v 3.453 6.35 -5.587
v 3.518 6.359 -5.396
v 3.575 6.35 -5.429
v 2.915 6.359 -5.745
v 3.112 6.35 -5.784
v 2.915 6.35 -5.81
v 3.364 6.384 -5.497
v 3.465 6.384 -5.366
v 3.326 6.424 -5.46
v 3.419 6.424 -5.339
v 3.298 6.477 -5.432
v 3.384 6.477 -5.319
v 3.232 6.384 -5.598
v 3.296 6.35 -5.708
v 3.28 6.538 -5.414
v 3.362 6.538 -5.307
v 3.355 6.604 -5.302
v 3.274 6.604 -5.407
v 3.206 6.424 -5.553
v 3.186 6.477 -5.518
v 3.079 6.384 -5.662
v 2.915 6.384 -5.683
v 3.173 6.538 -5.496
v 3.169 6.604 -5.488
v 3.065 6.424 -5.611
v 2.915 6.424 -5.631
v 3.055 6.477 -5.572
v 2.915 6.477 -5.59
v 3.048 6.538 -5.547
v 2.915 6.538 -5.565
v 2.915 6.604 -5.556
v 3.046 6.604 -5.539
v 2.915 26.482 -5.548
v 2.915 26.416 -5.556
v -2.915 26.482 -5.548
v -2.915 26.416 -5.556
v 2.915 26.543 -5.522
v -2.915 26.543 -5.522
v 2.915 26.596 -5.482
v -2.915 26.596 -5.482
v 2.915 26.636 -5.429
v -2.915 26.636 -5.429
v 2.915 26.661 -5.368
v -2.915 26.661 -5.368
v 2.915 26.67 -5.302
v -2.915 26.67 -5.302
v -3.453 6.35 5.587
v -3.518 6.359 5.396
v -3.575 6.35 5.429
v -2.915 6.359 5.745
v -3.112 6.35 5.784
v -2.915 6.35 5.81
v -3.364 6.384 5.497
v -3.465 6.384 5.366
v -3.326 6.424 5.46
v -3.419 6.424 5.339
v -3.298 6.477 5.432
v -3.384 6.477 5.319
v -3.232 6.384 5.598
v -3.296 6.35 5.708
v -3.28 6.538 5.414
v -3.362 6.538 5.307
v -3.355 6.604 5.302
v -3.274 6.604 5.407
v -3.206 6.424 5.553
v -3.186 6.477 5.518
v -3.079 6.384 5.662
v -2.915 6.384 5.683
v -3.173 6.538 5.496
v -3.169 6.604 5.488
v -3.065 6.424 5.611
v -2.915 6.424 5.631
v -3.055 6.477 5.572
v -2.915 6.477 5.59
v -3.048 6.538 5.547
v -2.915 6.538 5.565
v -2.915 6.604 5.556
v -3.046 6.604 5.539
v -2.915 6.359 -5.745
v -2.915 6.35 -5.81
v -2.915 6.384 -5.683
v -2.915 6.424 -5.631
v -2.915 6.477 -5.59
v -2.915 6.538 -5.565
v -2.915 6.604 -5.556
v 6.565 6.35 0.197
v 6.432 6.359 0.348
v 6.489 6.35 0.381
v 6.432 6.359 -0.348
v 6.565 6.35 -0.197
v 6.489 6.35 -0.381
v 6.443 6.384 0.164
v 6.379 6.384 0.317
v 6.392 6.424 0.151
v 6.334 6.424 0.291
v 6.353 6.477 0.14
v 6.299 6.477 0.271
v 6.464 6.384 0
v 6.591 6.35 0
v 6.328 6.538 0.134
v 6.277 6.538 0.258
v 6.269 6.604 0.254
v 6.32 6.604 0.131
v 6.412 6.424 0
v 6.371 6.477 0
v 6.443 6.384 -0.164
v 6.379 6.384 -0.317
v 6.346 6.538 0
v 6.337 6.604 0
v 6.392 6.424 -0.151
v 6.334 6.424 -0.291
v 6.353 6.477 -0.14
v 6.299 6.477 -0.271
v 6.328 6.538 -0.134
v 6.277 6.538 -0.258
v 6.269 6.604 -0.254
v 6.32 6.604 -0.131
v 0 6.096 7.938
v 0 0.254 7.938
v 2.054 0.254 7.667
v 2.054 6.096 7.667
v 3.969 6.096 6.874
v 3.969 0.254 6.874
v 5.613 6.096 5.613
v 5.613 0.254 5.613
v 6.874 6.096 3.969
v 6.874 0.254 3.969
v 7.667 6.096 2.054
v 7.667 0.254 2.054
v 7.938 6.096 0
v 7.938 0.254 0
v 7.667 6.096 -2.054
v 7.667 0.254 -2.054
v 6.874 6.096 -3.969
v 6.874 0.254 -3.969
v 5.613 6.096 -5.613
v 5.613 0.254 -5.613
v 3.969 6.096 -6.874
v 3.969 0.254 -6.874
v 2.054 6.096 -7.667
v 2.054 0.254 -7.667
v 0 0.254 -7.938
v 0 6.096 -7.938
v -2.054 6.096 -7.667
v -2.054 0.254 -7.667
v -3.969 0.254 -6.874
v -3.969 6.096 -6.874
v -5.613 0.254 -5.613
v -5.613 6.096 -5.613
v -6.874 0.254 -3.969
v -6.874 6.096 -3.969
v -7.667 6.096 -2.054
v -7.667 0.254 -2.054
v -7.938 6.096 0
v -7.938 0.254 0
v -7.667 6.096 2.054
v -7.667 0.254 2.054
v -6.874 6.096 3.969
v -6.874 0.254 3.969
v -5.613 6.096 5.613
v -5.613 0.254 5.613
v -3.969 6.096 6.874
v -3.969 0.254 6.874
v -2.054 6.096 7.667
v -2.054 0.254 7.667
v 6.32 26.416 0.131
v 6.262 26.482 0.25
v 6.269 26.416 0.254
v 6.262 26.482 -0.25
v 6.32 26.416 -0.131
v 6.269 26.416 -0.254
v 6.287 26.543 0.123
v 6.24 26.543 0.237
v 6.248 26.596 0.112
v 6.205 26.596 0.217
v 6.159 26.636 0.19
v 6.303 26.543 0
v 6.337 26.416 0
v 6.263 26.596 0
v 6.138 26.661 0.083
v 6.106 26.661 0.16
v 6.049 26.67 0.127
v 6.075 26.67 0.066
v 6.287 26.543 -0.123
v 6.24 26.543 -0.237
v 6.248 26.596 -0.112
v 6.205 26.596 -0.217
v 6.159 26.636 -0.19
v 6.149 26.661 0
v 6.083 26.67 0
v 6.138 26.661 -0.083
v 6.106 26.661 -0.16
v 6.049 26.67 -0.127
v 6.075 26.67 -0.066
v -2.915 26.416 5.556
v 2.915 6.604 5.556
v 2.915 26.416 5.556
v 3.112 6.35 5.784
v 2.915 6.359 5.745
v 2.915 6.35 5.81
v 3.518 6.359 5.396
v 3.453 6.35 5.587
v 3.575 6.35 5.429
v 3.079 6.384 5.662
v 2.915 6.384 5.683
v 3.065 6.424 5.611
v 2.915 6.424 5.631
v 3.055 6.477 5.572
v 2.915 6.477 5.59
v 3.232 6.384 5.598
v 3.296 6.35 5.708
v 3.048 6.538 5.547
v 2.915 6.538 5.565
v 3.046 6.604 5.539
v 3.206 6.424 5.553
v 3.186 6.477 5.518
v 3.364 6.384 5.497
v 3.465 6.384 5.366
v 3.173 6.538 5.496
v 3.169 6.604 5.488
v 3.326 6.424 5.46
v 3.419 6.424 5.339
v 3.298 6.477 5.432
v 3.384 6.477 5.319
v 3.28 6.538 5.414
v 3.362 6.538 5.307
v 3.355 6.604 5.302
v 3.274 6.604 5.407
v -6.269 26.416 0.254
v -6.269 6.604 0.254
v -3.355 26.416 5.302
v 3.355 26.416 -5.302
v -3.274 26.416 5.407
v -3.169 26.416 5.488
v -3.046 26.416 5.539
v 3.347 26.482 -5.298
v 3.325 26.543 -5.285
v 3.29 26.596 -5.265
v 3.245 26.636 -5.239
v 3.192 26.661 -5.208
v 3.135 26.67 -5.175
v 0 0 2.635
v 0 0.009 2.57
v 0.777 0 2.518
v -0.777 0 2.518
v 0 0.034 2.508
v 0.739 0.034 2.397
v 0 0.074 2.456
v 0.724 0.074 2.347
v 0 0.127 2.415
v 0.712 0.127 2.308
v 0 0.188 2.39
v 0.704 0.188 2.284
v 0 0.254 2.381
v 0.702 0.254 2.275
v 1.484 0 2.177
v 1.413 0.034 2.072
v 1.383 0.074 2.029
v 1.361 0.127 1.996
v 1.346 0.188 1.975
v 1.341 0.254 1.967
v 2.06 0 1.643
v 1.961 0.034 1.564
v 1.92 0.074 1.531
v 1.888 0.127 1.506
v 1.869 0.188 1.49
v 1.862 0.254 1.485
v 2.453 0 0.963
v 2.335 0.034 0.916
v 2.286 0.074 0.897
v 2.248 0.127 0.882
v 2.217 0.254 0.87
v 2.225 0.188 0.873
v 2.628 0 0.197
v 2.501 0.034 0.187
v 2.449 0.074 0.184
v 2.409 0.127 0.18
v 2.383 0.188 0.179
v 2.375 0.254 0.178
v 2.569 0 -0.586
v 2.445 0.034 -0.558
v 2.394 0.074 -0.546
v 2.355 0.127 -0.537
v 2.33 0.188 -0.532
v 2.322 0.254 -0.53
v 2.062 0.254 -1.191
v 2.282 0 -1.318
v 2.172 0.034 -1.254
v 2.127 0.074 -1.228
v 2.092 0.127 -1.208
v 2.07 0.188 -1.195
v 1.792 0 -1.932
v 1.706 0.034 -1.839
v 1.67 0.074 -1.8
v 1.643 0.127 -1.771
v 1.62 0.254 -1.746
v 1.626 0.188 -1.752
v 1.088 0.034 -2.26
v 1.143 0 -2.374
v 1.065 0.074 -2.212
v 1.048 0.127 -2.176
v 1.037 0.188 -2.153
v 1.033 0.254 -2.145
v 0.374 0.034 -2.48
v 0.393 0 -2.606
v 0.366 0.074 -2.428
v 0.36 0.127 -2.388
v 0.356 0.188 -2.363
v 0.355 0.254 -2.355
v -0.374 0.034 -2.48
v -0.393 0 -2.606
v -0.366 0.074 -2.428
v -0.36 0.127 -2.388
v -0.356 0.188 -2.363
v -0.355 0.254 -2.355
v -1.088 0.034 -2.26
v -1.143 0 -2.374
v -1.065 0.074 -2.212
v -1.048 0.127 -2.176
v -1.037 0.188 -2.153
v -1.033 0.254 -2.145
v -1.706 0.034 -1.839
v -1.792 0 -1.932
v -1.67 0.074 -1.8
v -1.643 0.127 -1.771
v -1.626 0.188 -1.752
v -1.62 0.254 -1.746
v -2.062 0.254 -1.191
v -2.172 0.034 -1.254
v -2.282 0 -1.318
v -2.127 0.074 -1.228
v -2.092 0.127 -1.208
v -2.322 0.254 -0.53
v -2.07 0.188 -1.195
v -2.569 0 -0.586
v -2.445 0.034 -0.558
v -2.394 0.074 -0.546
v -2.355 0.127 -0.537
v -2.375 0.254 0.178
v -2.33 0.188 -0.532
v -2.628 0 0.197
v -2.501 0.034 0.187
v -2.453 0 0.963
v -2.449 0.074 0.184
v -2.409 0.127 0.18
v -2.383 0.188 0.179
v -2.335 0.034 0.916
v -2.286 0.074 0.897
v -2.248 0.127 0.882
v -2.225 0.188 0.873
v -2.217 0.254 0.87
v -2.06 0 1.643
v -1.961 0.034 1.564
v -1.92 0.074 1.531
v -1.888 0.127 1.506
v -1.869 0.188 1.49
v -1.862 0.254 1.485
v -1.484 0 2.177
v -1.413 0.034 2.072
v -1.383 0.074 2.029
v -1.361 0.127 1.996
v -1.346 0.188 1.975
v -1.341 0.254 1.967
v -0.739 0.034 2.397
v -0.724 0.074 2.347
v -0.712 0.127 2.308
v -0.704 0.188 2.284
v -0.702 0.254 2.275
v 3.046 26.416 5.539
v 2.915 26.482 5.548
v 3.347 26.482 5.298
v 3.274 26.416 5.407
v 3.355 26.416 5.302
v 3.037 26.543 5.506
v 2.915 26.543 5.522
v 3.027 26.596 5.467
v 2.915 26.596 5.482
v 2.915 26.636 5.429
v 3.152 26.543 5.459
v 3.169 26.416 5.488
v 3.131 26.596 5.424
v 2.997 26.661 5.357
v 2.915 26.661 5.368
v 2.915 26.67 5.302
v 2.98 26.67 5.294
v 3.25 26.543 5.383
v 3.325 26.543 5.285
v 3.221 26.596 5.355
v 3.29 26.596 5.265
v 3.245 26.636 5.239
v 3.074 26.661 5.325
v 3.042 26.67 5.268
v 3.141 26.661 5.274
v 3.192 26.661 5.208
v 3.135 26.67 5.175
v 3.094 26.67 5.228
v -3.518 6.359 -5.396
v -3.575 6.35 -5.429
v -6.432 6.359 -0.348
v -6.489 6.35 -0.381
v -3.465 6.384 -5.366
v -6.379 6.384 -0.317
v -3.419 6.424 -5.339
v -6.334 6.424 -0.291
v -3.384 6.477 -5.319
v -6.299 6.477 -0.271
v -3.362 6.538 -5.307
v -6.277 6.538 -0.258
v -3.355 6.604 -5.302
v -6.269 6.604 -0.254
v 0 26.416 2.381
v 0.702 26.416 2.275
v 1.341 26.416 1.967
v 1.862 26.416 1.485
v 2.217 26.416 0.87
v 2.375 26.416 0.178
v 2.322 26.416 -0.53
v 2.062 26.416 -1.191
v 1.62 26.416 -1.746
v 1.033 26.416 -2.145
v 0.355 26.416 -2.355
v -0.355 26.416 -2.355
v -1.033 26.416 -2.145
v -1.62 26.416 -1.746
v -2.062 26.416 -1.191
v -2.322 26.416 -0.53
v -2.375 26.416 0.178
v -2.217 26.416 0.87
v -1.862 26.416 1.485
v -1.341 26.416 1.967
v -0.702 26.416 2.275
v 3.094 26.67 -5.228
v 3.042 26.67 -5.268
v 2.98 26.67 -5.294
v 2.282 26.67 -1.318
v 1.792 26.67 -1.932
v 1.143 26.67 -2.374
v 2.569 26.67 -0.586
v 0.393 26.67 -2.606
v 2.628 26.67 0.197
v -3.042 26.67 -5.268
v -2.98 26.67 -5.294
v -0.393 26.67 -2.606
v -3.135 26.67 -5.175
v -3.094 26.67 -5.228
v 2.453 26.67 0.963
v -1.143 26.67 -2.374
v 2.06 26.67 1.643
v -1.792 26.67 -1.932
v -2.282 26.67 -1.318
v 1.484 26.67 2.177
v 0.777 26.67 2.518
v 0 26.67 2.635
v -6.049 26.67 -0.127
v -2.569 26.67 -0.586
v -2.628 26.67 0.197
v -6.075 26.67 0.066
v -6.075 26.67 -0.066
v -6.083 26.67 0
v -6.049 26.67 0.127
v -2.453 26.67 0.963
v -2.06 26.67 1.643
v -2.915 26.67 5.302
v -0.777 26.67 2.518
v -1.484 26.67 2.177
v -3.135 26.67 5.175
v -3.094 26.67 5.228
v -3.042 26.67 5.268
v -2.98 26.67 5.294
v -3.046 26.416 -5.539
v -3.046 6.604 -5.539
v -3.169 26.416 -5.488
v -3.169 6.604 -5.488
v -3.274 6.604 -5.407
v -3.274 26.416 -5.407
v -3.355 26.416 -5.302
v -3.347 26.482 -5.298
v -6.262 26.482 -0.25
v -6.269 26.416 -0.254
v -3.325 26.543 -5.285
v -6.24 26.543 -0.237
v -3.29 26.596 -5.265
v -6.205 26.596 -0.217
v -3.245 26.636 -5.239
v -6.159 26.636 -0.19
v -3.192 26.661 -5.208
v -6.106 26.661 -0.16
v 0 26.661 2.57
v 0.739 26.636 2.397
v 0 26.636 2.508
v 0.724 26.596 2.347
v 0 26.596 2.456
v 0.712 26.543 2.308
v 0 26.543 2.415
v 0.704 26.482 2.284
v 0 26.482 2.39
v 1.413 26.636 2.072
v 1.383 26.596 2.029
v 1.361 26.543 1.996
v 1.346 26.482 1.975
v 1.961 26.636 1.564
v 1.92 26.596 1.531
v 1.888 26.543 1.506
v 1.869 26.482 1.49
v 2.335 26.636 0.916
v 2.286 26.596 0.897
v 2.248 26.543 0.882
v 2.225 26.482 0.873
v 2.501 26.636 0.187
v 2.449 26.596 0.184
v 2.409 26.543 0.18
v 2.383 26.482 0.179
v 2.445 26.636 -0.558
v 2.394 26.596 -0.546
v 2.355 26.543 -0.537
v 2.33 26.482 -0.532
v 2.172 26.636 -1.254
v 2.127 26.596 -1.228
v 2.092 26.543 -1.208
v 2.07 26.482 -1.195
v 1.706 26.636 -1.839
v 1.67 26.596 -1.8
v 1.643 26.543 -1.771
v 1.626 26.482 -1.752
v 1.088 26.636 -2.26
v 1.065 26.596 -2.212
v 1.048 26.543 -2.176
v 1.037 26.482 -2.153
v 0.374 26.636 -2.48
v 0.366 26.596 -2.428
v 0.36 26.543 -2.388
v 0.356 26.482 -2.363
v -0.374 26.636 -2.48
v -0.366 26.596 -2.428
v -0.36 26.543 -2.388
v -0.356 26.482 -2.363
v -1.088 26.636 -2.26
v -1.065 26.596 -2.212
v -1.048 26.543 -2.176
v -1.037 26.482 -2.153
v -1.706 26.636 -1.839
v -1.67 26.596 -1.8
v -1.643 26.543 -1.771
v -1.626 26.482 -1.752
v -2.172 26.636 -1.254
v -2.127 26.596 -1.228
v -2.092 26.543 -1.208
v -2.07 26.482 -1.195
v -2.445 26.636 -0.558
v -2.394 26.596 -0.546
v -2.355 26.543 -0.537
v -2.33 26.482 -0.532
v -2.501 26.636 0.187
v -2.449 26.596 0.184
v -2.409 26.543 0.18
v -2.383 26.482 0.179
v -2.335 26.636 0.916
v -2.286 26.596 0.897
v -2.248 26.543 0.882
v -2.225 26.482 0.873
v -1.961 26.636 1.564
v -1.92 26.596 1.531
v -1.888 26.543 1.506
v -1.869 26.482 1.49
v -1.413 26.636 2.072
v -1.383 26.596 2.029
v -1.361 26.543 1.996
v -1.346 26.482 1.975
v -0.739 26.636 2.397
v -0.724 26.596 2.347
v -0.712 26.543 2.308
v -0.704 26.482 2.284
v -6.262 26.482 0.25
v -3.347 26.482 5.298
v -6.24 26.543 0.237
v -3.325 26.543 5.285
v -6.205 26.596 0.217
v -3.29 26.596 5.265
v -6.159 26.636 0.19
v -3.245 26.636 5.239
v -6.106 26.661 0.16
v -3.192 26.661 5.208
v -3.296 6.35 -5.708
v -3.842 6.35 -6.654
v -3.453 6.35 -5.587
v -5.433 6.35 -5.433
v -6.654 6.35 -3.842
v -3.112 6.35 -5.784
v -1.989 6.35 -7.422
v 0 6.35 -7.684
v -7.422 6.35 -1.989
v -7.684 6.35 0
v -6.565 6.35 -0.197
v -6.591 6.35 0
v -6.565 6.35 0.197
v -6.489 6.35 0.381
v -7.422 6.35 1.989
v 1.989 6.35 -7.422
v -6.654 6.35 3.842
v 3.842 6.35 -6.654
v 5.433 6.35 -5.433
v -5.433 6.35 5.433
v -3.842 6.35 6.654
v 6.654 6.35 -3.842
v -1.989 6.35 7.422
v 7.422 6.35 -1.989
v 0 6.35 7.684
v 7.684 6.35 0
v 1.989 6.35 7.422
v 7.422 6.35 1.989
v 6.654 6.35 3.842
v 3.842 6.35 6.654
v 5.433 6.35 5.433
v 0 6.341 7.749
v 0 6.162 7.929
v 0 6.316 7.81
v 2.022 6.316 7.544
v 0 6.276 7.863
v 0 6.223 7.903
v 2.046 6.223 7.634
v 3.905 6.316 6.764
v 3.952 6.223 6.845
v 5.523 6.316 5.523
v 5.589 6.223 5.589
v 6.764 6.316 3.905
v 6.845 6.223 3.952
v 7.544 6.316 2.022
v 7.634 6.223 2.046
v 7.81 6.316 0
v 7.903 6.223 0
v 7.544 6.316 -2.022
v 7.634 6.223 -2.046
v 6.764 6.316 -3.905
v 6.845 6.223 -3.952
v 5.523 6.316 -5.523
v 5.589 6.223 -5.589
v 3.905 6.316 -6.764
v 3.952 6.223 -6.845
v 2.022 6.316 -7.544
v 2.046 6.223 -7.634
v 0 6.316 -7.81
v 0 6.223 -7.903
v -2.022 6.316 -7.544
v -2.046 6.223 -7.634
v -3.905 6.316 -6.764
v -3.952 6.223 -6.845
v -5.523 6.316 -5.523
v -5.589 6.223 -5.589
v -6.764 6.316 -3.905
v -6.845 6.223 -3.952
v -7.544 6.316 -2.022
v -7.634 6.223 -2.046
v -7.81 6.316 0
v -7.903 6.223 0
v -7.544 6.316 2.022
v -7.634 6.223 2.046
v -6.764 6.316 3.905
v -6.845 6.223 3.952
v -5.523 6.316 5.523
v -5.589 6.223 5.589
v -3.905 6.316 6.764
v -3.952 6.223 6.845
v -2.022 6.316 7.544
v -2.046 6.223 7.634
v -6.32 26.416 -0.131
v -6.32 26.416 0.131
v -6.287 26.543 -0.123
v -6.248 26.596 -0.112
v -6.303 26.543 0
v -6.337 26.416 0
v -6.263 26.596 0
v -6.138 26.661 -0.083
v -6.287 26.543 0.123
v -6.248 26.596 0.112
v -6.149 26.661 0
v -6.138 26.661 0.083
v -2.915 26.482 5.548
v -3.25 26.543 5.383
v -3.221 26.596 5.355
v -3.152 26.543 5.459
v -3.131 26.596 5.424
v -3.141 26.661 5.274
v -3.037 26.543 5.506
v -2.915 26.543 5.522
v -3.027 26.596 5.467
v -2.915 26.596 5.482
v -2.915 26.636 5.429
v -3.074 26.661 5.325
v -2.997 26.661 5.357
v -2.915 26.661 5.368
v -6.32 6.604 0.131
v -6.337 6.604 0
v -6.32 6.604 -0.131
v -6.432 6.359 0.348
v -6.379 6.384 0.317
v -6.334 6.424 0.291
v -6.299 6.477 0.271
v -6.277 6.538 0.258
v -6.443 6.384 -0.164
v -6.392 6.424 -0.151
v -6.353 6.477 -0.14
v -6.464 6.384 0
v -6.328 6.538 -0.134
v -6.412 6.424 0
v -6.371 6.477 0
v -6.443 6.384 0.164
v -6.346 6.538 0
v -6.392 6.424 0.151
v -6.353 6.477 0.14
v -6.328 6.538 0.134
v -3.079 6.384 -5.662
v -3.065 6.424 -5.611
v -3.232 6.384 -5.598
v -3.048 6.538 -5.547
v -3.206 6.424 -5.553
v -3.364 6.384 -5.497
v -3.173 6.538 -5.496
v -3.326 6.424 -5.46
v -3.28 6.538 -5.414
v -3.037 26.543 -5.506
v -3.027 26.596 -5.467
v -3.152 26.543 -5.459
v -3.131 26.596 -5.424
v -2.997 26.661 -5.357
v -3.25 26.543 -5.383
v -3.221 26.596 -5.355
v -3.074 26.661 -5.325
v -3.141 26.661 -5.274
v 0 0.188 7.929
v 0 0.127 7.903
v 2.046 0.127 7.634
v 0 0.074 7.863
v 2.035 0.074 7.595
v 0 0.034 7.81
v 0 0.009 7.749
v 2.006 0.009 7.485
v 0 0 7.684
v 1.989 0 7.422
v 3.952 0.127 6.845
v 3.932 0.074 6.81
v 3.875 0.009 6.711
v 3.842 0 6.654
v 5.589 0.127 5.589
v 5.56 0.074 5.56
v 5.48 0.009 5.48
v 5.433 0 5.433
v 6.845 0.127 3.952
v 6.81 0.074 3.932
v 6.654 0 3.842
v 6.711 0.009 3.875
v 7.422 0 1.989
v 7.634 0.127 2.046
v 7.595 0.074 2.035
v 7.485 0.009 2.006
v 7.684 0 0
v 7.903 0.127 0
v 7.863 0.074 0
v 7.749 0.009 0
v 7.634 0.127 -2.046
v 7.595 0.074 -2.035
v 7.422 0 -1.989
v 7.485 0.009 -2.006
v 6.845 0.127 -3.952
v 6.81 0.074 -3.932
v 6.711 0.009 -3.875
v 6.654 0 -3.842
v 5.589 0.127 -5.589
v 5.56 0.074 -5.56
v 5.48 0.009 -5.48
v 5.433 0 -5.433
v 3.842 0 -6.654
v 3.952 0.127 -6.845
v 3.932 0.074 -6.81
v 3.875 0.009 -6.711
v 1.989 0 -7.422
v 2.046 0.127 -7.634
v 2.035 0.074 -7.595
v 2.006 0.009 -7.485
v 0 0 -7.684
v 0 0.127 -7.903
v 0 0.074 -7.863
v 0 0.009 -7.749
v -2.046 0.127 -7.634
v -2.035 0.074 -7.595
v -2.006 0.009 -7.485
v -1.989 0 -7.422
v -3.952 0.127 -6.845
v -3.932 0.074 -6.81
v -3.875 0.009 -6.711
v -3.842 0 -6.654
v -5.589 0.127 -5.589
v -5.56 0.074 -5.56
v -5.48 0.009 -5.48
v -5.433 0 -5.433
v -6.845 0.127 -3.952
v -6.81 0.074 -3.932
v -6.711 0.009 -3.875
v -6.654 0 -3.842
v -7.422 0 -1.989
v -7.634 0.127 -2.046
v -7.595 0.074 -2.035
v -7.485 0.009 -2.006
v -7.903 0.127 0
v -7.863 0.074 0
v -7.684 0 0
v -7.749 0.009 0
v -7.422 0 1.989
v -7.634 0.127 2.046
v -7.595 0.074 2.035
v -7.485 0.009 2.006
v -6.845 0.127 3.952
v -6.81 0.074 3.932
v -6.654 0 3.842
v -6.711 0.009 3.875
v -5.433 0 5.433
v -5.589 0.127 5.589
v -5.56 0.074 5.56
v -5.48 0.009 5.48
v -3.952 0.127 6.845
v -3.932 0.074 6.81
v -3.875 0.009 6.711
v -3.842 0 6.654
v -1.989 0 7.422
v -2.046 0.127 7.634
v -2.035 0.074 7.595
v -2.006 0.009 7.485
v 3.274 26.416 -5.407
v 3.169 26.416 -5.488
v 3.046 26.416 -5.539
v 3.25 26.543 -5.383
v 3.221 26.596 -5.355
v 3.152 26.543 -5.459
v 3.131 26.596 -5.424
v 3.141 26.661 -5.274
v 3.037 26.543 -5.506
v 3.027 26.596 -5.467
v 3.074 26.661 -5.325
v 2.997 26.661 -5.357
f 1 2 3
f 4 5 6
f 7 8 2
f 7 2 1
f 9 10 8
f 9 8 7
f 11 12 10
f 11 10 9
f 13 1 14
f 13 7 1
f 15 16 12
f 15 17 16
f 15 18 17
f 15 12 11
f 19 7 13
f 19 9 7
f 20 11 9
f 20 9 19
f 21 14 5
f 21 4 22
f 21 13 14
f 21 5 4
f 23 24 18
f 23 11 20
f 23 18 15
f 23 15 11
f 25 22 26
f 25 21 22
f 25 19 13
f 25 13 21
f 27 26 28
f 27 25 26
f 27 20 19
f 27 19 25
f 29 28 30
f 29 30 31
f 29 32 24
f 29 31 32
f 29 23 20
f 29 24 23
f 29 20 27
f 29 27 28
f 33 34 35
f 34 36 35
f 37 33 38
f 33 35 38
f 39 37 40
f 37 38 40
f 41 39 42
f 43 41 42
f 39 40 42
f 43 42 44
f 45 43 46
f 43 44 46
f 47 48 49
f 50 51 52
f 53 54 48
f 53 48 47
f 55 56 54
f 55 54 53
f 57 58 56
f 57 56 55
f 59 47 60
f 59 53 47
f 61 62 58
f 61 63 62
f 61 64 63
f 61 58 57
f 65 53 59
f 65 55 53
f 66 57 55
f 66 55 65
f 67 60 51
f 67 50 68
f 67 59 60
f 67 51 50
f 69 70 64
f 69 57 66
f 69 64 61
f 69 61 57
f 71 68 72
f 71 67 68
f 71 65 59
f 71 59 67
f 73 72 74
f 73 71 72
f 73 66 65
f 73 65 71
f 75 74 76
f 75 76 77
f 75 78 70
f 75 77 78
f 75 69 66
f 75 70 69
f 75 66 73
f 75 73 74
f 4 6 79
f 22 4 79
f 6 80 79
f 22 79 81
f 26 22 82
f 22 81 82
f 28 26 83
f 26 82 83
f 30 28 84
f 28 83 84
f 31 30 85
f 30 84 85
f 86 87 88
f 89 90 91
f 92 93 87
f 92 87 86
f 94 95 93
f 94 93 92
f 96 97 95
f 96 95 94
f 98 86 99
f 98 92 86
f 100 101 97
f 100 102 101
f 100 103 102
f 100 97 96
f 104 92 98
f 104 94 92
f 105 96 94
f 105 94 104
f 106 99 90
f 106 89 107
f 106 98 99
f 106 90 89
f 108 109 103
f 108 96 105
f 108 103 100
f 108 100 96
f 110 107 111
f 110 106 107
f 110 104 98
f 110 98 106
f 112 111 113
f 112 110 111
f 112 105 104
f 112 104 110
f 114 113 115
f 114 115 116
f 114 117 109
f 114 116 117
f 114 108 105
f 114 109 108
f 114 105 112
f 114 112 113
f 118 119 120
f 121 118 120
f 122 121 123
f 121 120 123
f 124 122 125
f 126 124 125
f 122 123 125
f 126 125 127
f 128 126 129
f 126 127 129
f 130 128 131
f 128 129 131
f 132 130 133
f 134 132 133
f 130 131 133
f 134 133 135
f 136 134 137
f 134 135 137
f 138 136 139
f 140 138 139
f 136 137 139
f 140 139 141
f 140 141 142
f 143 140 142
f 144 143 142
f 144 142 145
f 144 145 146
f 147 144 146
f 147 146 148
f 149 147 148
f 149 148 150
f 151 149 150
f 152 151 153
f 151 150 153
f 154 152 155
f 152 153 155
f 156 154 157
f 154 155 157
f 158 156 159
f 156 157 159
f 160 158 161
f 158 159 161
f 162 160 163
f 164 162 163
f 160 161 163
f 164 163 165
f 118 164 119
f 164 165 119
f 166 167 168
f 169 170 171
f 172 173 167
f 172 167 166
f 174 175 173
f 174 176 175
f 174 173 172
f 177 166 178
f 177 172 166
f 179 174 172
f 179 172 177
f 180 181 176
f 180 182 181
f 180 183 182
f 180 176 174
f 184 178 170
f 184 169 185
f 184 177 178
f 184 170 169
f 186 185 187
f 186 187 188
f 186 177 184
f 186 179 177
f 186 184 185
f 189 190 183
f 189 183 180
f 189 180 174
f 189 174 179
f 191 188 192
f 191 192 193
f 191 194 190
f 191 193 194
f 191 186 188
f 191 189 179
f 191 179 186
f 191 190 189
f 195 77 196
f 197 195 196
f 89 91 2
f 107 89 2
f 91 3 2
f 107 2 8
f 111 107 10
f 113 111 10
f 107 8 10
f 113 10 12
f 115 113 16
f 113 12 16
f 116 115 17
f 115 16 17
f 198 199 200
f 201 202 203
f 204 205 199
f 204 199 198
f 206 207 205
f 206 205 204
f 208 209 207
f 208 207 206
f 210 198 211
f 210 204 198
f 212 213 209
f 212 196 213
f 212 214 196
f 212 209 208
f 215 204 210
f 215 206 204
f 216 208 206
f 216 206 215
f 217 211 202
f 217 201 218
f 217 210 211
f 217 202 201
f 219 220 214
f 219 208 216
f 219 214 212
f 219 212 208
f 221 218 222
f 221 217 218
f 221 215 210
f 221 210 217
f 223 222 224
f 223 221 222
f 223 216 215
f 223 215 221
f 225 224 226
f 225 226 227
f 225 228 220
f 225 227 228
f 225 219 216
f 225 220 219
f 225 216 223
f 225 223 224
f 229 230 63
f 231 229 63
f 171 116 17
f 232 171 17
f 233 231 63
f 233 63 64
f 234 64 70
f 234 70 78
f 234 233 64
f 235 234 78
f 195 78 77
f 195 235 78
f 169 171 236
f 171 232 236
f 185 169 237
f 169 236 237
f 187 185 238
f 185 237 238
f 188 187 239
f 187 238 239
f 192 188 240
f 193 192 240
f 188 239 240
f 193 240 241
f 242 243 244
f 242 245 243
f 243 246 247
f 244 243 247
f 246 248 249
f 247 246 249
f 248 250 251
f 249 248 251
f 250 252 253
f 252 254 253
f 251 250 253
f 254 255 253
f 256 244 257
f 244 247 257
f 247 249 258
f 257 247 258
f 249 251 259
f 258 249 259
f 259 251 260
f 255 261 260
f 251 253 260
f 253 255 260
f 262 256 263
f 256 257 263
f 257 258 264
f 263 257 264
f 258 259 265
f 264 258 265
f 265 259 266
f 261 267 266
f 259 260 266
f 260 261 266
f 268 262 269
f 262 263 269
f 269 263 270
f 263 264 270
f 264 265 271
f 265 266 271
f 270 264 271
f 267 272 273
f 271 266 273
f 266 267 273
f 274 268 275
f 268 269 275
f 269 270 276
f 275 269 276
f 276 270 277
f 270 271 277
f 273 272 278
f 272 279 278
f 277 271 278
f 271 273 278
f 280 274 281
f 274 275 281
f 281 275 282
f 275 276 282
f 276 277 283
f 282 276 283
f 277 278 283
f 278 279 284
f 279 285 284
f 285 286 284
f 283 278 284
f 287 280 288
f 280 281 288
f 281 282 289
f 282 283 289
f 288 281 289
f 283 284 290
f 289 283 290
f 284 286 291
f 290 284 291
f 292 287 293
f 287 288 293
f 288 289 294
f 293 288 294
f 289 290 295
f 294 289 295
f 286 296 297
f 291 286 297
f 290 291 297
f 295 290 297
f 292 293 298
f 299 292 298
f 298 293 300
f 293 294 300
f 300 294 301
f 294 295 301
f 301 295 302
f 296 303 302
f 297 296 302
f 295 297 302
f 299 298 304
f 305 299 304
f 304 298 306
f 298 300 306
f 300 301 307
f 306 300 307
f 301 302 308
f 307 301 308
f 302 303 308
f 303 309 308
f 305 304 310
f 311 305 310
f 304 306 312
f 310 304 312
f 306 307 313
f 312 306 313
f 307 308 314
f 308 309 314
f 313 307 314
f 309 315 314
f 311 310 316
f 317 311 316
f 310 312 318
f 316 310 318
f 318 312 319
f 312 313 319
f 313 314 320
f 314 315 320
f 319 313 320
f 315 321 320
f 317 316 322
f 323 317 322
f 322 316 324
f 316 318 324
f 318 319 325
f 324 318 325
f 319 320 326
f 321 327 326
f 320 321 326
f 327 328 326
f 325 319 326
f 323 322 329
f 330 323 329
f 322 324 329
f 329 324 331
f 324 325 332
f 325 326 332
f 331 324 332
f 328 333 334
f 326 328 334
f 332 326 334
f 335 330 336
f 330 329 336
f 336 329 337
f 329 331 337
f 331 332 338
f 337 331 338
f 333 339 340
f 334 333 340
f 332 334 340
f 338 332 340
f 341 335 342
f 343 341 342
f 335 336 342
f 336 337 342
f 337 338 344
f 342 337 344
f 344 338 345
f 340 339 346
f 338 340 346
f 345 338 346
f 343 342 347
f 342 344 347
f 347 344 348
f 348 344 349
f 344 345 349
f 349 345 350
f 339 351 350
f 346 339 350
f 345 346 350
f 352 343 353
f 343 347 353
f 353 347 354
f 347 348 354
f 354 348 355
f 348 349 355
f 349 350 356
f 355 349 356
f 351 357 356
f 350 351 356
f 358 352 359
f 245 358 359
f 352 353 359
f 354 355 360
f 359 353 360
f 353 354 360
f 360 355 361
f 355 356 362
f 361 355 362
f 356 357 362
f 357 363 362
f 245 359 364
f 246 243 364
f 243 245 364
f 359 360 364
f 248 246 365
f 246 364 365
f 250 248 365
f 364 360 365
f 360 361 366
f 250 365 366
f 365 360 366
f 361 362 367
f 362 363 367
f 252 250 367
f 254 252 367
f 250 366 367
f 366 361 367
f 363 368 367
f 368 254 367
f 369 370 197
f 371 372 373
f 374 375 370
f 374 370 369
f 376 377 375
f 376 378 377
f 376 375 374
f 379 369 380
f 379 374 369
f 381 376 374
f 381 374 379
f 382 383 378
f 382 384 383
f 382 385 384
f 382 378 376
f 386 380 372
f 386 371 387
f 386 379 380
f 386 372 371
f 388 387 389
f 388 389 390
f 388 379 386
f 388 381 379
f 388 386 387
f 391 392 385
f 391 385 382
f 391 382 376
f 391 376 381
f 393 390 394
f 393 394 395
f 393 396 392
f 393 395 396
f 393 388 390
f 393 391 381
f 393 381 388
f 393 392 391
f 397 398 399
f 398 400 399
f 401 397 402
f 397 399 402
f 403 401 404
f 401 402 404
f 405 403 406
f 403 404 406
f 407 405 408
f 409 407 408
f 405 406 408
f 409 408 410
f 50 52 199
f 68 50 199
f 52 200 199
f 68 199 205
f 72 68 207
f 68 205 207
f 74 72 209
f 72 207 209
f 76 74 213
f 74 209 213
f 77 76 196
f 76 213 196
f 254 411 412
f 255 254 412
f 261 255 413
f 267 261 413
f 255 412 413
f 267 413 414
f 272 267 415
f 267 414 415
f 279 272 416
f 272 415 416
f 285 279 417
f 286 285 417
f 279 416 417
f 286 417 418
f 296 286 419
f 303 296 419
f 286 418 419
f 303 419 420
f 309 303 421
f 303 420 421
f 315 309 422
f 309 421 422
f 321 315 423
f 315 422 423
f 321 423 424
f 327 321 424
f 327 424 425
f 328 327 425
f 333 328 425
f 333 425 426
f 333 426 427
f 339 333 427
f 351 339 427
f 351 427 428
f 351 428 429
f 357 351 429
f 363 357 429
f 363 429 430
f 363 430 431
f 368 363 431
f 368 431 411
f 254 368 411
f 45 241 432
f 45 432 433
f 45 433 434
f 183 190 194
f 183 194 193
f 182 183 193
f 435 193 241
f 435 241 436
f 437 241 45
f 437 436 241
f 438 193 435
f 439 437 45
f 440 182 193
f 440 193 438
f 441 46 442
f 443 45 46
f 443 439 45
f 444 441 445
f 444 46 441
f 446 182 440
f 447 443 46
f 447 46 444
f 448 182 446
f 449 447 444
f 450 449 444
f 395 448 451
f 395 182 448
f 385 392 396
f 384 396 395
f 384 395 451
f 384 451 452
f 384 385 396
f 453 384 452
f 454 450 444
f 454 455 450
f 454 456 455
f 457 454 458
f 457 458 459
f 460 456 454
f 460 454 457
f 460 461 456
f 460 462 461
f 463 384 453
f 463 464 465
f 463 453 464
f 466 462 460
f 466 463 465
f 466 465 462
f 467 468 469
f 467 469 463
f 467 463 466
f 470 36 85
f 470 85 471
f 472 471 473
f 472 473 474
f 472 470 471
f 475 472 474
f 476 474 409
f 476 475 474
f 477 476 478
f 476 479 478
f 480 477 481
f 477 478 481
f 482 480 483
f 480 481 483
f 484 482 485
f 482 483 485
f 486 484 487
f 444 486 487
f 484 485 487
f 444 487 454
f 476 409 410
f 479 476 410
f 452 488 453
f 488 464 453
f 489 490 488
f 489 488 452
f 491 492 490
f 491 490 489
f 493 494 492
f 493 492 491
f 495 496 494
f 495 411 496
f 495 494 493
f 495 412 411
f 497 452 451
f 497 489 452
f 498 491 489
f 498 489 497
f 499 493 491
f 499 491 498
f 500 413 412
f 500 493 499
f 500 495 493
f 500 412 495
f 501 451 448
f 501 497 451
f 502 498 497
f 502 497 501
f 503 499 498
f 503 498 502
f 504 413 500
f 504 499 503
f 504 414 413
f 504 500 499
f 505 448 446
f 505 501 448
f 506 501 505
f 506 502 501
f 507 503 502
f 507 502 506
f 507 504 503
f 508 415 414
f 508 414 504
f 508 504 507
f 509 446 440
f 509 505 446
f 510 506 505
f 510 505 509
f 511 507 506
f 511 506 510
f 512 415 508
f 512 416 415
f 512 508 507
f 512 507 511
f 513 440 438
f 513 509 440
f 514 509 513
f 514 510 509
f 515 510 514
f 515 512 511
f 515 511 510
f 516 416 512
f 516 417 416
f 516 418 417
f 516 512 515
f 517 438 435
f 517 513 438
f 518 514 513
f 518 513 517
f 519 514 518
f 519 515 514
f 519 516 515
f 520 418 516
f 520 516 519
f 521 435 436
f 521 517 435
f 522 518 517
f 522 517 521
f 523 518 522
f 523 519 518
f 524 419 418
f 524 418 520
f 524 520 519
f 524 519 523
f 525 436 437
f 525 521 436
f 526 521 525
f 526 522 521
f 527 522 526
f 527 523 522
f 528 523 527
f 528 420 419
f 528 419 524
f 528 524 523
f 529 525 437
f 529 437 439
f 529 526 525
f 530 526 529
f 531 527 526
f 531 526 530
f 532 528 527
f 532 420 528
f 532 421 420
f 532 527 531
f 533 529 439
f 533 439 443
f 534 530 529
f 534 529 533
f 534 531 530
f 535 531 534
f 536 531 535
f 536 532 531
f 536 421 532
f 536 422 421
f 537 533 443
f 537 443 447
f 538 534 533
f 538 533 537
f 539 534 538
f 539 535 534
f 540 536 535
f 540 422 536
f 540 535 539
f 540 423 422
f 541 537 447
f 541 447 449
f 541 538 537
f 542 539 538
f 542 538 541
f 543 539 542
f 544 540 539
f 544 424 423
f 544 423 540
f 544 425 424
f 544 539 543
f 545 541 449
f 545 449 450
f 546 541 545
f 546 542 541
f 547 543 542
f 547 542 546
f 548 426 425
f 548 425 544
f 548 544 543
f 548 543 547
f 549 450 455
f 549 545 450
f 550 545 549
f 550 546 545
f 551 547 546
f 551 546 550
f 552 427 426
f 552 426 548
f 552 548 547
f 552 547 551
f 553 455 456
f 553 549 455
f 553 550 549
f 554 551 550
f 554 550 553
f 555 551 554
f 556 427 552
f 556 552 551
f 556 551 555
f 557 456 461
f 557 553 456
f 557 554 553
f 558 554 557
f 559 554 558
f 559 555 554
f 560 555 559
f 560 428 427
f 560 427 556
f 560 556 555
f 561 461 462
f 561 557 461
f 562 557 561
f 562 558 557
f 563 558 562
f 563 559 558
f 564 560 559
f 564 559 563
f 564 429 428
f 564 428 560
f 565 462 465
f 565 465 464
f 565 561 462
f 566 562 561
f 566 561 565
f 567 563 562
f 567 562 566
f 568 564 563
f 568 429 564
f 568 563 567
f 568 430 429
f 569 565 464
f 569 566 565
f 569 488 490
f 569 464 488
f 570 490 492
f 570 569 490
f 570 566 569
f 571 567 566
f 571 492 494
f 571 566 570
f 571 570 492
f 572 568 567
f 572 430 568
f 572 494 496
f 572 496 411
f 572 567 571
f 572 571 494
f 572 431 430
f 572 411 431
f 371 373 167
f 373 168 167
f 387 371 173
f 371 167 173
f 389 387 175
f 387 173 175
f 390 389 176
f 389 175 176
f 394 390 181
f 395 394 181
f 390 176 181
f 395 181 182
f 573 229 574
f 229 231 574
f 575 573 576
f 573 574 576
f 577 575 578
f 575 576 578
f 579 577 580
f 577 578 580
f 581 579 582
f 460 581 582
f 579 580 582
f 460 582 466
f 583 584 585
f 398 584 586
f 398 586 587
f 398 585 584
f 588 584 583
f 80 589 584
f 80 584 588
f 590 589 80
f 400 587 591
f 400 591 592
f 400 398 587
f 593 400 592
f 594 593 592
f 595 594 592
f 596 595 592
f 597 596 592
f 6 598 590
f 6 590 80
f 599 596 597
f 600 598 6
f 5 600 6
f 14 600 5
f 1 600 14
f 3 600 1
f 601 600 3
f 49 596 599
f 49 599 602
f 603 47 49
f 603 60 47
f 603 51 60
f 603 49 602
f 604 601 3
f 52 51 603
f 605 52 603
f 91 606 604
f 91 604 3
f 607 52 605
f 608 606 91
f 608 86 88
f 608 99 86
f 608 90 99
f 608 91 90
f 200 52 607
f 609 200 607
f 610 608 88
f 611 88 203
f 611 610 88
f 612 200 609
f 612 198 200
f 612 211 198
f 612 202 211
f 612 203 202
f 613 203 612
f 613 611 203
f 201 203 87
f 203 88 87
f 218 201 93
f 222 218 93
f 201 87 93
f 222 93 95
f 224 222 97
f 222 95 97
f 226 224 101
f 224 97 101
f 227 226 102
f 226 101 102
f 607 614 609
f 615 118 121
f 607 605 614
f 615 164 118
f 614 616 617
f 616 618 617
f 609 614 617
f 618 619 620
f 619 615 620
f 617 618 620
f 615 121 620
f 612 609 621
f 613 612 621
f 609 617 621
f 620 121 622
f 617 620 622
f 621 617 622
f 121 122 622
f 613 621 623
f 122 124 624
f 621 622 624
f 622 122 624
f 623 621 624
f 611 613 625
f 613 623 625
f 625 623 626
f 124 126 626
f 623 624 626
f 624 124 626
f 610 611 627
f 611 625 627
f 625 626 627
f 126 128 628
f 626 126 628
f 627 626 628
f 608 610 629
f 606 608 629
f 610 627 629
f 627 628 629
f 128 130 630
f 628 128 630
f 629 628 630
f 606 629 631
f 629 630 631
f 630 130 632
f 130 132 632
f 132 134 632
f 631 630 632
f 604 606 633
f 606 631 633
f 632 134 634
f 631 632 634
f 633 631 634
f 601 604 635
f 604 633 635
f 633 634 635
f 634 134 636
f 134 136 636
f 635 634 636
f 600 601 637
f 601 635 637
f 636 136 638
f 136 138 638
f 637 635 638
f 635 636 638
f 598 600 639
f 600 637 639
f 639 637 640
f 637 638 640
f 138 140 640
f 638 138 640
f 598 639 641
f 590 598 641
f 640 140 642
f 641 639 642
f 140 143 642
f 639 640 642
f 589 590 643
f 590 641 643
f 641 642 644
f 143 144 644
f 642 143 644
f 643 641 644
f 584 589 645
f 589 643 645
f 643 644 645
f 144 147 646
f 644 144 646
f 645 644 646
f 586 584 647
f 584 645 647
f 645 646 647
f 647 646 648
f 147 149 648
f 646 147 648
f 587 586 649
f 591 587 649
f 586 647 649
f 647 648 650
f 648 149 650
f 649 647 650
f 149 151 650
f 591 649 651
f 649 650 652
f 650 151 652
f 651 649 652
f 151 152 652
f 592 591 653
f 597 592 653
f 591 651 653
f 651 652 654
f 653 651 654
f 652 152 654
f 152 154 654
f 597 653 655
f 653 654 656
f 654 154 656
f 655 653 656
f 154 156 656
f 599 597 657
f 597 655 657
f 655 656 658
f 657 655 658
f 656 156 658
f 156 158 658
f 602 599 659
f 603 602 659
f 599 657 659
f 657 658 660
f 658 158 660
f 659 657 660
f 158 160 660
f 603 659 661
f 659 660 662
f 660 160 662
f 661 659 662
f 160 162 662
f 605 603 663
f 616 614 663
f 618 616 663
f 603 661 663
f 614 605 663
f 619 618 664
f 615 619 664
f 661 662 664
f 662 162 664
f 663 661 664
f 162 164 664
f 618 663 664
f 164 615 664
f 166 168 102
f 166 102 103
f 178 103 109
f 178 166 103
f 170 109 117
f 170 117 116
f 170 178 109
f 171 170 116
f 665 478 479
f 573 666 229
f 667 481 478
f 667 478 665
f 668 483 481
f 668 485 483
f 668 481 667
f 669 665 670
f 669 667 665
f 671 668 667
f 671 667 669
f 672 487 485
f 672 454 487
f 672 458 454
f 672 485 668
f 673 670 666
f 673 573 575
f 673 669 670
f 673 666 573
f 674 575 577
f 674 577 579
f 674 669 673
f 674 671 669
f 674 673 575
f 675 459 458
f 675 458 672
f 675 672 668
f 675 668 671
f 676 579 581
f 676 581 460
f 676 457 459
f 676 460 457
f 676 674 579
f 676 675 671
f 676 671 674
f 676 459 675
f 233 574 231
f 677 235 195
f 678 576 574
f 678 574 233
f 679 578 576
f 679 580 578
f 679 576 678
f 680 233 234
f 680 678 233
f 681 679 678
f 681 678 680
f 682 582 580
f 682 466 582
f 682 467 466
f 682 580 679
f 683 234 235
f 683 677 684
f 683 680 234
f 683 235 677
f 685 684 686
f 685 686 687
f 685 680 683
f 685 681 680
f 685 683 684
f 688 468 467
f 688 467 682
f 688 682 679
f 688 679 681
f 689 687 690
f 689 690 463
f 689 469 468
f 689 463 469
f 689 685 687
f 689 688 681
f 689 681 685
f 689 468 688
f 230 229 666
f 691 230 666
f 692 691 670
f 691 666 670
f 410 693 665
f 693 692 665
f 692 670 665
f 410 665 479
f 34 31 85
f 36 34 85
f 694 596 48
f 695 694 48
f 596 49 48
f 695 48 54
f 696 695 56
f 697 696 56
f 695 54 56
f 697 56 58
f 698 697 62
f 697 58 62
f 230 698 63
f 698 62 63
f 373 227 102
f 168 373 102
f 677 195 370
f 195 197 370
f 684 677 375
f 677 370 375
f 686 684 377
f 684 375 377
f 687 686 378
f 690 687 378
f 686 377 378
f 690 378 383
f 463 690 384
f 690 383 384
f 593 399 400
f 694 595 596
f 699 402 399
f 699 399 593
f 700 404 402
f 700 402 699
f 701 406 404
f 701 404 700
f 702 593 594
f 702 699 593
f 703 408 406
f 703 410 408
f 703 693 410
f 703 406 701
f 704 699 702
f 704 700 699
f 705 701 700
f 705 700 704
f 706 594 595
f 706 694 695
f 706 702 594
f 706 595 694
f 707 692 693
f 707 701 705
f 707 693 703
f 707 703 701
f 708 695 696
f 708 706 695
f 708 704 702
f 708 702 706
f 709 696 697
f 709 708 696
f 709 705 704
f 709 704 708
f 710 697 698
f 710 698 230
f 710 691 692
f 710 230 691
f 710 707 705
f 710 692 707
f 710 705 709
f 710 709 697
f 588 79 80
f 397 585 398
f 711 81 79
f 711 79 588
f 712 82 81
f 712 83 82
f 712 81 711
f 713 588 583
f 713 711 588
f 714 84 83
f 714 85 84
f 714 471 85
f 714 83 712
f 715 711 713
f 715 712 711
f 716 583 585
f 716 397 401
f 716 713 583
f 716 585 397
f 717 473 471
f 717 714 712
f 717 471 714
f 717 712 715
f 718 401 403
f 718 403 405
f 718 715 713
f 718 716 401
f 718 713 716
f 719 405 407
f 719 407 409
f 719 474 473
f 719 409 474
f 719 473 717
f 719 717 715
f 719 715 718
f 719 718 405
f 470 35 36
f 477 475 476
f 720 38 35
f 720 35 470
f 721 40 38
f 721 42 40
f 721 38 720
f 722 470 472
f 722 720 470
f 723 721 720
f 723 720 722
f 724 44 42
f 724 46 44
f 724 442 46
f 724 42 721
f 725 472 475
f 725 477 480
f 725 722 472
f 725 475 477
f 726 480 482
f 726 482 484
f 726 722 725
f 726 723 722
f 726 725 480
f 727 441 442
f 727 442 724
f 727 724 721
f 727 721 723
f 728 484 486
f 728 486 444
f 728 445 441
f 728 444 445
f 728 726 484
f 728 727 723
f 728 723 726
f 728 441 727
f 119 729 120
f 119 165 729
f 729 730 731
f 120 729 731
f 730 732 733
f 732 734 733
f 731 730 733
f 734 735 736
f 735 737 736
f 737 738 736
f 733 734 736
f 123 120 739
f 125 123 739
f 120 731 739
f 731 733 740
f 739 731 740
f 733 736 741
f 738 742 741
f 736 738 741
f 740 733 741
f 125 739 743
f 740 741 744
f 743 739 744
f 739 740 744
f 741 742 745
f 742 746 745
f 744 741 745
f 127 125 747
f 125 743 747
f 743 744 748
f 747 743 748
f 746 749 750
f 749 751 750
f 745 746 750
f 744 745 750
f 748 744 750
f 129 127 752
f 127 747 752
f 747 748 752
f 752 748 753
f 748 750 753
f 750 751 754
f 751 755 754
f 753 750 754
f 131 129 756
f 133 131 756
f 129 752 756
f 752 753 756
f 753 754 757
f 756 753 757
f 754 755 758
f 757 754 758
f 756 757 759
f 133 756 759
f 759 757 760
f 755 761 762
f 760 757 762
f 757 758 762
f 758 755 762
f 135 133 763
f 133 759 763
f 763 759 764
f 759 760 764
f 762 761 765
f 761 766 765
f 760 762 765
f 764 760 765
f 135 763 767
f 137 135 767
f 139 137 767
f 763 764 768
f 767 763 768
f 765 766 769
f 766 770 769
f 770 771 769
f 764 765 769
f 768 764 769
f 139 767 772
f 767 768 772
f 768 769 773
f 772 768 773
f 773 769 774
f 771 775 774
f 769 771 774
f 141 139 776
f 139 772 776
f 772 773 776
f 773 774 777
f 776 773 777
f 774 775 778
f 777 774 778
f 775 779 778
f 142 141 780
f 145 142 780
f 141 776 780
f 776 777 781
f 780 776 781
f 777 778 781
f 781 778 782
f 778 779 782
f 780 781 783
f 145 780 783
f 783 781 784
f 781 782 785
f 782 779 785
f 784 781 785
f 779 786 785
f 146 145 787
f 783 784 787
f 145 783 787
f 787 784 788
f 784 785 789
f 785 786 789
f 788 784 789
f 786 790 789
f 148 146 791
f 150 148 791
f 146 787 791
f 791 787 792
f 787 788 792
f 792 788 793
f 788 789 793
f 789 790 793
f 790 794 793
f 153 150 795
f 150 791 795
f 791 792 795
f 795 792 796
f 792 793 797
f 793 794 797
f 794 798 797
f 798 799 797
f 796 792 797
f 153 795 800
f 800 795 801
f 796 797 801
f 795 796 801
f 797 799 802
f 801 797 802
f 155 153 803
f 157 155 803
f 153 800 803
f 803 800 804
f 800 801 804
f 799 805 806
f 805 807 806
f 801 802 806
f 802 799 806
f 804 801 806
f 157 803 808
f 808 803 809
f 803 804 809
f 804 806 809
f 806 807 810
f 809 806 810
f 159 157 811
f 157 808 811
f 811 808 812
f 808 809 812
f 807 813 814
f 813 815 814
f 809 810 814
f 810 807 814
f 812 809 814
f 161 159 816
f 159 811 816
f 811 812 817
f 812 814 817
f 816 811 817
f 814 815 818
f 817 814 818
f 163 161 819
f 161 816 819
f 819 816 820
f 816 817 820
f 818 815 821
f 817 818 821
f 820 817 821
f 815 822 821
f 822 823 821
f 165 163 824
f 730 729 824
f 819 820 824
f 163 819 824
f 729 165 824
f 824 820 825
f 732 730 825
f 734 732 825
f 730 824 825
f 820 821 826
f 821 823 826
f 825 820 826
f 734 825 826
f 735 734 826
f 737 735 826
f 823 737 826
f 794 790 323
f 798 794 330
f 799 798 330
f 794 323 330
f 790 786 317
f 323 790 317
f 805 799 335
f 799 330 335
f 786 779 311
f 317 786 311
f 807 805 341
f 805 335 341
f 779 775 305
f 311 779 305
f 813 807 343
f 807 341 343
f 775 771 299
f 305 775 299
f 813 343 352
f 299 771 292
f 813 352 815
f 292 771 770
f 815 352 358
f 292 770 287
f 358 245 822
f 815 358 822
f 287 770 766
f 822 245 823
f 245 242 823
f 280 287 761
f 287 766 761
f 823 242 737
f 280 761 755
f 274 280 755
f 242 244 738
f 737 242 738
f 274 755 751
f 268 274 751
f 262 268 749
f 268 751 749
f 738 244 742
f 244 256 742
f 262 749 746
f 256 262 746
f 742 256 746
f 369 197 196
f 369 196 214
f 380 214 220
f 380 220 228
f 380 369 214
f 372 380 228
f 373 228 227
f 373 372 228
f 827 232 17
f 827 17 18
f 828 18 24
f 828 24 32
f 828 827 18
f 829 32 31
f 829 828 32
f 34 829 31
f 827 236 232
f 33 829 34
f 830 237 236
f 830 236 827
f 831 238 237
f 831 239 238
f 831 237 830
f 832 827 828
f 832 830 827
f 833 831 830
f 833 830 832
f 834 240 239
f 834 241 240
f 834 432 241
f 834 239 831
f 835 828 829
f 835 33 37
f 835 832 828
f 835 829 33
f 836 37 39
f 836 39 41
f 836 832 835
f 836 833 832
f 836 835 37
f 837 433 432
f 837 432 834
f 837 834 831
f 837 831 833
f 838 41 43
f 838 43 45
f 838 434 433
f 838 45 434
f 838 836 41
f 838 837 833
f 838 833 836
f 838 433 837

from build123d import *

# Parameters (mm, degrees)
SKETCH1_R          = 7.9375
EXTRUDE1_DEPTH     = 6.35
EXTRUDE2_DEPTH     = 20.32
SKETCH3_R          = 2.38125
CUT_EXTRUDE1_DEPTH = 29.936079771
FILLET1_R          = 0.508
FILLET2_R          = 0.254


with BuildPart() as part:
    # Sketch1 → Extrude1 (new body)
    with BuildSketch(Plane(origin=(0, 0, 0), x_dir=(1, 0, 0), z_dir=(0, 1, 0))):
        with Locations(Location((0, 0, 0), (0, 0, 270))):
            Circle(SKETCH1_R)
    extrude(amount=EXTRUDE1_DEPTH)

    # Sketch2 → Extrude2 (add)
    with BuildSketch(Plane(origin=(0, 6.35, 0), x_dir=(-1, 0, 0), z_dir=(0, 1, 0))):
        Polygon((6.415804866, 0), (3.207902433, 5.55625), (-3.207902433, 5.55625), (-6.415804866, 0), (-3.207902433, -5.55625), (3.207902433, -5.55625), align=None)
    extrude(amount=EXTRUDE2_DEPTH)

    # Sketch3 → Cut-Extrude1 (cut, through all)
    with BuildSketch(Plane(origin=(0, 26.67, 0), x_dir=(-1, 0, 0), z_dir=(0, 1, 0))):
        with Locations(Location((0, 0, 0), (0, 0, 90))):
            Circle(SKETCH3_R)
    extrude(amount=-CUT_EXTRUDE1_DEPTH, mode=Mode.SUBTRACT)

    # Fillet1
    fillet1_edges = [part.edges().sort_by_distance(p)[0] for p in [
        (6.415804866, 16.51, 0),
        (3.207902433, 16.51, -5.55625),
        (-3.207902433, 16.51, -5.55625),
        (-6.415804866, 16.51, 0),
        (-3.207902433, 16.51, 5.55625),
        (3.207902433, 16.51, 5.55625),
    ]]
    fillet(fillet1_edges, radius=FILLET1_R)

    # Fillet2
    fillet2_edges = [part.edges().sort_by_distance(p)[0] for p in [
        (0, 0, -7.9375),
        (0, 0, -2.38125),
        (0, 26.67, -2.38125),
        (-4.81185365, 6.35, -2.778125),
        (-4.81185365, 26.67, -2.778125),
        (0, 6.35, -5.55625),
        (0, 26.67, -5.55625),
        (-4.81185365, 26.67, 2.778125),
        (0, 26.67, 5.55625),
        (4.81185365, 26.67, 2.778125),
        (4.81185365, 26.67, -2.778125),
        (-6.337216993, 26.67, 0),
        (-3.168608496, 26.67, 5.488190905),
        (3.168608496, 26.67, 5.488190905),
        (6.337216993, 26.67, 0),
        (3.168608496, 26.67, -5.488190905),
        (-3.168608496, 26.67, -5.488190905),
        (4.81185365, 6.35, -2.778125),
        (4.81185365, 6.35, 2.778125),
        (0, 6.35, -7.9375),
        (0, 6.35, 5.55625),
        (-4.81185365, 6.35, 2.778125),
        (-3.168608496, 6.35, -5.488190905),
        (3.168608496, 6.35, -5.488190905),
        (6.337216993, 6.35, 0),
        (3.168608496, 6.35, 5.488190905),
        (-3.168608496, 6.35, 5.488190905),
        (-6.337216993, 6.35, 0),
    ]]
    fillet(fillet2_edges, radius=FILLET2_R)


solid = part.part
